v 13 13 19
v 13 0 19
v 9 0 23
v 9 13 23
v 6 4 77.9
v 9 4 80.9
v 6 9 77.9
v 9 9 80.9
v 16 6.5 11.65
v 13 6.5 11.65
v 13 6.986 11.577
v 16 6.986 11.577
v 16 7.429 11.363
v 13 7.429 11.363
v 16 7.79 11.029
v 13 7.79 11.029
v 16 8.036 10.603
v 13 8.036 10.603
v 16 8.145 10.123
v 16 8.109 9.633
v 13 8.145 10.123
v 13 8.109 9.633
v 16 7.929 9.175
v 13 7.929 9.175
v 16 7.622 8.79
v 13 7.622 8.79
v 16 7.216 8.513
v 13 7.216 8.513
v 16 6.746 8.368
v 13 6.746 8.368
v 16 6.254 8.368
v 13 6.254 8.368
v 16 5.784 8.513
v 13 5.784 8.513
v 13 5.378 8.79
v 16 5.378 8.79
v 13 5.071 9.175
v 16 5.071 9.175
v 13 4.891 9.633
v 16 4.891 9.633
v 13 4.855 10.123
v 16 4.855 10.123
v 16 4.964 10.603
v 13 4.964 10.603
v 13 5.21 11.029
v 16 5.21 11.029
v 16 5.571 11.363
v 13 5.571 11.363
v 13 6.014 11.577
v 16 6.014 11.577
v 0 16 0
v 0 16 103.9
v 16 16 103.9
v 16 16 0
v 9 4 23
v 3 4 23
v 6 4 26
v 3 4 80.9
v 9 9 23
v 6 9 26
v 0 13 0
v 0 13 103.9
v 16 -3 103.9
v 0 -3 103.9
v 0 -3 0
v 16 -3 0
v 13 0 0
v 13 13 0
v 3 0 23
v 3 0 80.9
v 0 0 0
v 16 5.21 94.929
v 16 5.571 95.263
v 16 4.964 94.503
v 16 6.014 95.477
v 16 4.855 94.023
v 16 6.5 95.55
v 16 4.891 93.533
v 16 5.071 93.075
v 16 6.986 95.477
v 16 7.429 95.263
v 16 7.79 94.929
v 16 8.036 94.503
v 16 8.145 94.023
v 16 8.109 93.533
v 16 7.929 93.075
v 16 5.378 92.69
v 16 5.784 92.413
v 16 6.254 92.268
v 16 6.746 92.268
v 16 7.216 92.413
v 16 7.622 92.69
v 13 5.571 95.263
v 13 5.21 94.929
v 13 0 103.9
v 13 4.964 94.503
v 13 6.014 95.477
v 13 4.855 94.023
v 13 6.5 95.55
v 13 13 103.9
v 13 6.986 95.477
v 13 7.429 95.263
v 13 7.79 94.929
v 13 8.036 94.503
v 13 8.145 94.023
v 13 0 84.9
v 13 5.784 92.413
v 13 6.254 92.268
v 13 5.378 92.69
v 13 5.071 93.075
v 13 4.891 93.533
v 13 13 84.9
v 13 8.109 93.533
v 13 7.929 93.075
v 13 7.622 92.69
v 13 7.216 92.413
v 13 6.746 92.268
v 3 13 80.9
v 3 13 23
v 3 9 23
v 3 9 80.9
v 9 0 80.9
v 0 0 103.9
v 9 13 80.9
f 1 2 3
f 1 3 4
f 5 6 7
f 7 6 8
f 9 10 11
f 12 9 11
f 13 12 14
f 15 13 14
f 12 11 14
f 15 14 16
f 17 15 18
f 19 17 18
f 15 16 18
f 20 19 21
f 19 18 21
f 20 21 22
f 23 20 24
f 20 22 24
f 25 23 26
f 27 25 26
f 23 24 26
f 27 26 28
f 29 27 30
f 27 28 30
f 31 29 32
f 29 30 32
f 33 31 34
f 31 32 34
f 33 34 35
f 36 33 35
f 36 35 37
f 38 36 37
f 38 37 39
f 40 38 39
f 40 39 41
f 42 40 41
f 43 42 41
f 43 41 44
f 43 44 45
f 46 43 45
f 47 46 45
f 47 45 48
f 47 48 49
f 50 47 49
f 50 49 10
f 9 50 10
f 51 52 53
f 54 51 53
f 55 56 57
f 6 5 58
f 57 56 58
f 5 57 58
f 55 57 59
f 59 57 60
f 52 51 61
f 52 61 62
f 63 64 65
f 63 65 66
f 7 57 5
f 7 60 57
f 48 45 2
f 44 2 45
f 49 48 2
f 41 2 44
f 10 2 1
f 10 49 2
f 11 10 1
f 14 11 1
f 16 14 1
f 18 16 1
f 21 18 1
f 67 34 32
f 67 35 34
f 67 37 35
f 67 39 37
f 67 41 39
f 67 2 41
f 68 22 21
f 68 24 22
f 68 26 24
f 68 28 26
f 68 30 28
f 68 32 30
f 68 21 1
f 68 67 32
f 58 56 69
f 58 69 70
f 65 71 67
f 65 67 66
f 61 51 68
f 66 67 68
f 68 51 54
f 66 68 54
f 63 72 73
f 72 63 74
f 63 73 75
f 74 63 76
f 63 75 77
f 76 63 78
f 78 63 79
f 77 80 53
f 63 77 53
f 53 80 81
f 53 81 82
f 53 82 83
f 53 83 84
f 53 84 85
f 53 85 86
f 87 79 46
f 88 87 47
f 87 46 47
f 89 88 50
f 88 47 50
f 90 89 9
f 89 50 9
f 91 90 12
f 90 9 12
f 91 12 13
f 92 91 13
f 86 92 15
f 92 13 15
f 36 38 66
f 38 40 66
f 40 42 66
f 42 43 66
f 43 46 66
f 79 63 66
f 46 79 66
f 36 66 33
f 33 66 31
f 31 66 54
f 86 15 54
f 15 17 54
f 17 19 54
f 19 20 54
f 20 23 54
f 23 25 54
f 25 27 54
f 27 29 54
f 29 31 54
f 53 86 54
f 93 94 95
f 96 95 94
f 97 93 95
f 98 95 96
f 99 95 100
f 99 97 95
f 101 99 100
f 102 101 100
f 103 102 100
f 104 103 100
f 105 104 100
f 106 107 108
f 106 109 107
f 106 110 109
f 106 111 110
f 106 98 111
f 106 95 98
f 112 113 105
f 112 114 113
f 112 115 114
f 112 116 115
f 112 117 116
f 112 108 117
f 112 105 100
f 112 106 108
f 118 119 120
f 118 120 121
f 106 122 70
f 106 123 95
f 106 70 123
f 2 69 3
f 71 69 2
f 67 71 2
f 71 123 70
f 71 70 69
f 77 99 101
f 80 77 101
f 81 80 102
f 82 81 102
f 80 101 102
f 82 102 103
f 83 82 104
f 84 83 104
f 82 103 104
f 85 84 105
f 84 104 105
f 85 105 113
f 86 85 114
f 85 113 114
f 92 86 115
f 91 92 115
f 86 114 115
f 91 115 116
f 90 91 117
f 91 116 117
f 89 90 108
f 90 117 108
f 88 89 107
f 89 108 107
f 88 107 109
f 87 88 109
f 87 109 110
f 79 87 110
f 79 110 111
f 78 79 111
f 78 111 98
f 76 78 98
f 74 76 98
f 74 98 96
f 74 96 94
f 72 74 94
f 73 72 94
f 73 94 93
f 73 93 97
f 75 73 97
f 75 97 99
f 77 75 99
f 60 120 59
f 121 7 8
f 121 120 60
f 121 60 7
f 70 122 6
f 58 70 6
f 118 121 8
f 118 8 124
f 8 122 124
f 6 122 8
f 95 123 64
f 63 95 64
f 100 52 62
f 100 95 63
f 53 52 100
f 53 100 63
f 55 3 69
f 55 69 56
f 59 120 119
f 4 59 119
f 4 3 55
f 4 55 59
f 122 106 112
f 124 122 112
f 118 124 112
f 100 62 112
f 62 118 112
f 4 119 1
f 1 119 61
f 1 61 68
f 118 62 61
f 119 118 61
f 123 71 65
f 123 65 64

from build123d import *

# Parameters (mm, degrees)
SKETCH_1_W          = 19
SKETCH_1_H          = 19
SKETCH_1_W_2        = 13
SKETCH_1_H_2        = 13
EXTRUDE_1_DEPTH     = 103.9
SKETCH_2_R          = 1.65
CUT_EXTRUDE_1_DEPTH = 30
SKETCH_3_W          = 116.915177823
SKETCH_3_H          = 46.219516436
CUT_EXTRUDE_2_DEPTH = 3
SKETCH_4_W          = 5
SKETCH_4_H          = 13
EXTRUDE_1_2_DEPTH   = 10
SKETCH_5_W          = 47.9
SKETCH_5_H          = 5
EXTRUDE_2_DEPTH     = 10
SKETCH_6_W          = 57.9
SKETCH_6_H          = 13
EXTRUDE_3_DEPTH     = 10
SKETCH_8_W          = 57.9
SKETCH_8_H          = 5
CUT_EXTRUDE_3_DEPTH = 3
CHAMFER_1_SIZE      = 3
CHAMFER_2_SIZE      = 4


with BuildPart() as part:
    # 草图1 → Extrude 1 (new body)
    with BuildSketch(Plane.XY):
        with Locations((6.5, 6.5)):
            Rectangle(SKETCH_1_W, SKETCH_1_H)
        with Locations((6.5, 6.5)):
            Rectangle(SKETCH_1_W_2, SKETCH_1_H_2, mode=Mode.SUBTRACT)
    extrude(amount=EXTRUDE_1_DEPTH)

    # 草图2 → 切除-拉伸1 (cut)
    with BuildSketch(Plane.ZY.offset(3)):
        with Locations((10, 6.5)):
            Circle(SKETCH_2_R)
        with Locations((93.9, 6.5)):
            Circle(SKETCH_2_R)
    extrude(amount=-CUT_EXTRUDE_1_DEPTH, mode=Mode.SUBTRACT)

    # 草图3 → 切除-拉伸2 (cut)
    with BuildSketch(Plane.ZY.offset(3)):
        with Locations((53.162237228, 0.202739406)):
            Rectangle(SKETCH_3_W, SKETCH_3_H)
    extrude(amount=-CUT_EXTRUDE_2_DEPTH, mode=Mode.SUBTRACT)

    # 草图4 → Extrude 1 2 (add)
    with BuildSketch(Plane.ZY.offset(-13)):
        with Locations((25.5, 6.5)):
            Rectangle(SKETCH_4_W, SKETCH_4_H)
        with Locations((78.4, 6.5)):
            Rectangle(SKETCH_4_W, SKETCH_4_H)
    extrude(amount=EXTRUDE_1_2_DEPTH)

    # 草图5 → 凸台-拉伸2 (add)
    with BuildSketch(Plane.ZY.offset(-13)):
        with Locations((51.95, 6.5)):
            Rectangle(SKETCH_5_W, SKETCH_5_H)
    extrude(amount=EXTRUDE_2_DEPTH)

    # 草图6 → 凸台-拉伸3 (add)
    with BuildSketch(Plane.ZY.offset(-13)):
        with Locations((51.95, 6.5)):
            Rectangle(SKETCH_6_W, SKETCH_6_H)
    extrude(amount=EXTRUDE_3_DEPTH)

    # 草图8 → 切除-拉伸3 (cut)
    with BuildSketch(Plane.ZY.offset(-3)):
        with Locations((51.95, 6.5)):
            Rectangle(SKETCH_8_W, SKETCH_8_H)
    extrude(amount=-CUT_EXTRUDE_3_DEPTH, mode=Mode.SUBTRACT)

    # 倒角1
    chamfer_1_edges = [part.edges().sort_by_distance(p)[0] for p in [
        (6, 6.5, 23),
        (6, 6.5, 80.9),
    ]]
    chamfer(chamfer_1_edges, length=CHAMFER_1_SIZE)

    # 倒角2
    chamfer_2_edges = [part.edges().sort_by_distance(p)[0] for p in [
        (13, 6.5, 23),
        (13, 6.5, 80.9),
    ]]
    chamfer(chamfer_2_edges, length=CHAMFER_2_SIZE - 0.0001)  # a hair under: the kernel refuses the full size


solid = part.part
